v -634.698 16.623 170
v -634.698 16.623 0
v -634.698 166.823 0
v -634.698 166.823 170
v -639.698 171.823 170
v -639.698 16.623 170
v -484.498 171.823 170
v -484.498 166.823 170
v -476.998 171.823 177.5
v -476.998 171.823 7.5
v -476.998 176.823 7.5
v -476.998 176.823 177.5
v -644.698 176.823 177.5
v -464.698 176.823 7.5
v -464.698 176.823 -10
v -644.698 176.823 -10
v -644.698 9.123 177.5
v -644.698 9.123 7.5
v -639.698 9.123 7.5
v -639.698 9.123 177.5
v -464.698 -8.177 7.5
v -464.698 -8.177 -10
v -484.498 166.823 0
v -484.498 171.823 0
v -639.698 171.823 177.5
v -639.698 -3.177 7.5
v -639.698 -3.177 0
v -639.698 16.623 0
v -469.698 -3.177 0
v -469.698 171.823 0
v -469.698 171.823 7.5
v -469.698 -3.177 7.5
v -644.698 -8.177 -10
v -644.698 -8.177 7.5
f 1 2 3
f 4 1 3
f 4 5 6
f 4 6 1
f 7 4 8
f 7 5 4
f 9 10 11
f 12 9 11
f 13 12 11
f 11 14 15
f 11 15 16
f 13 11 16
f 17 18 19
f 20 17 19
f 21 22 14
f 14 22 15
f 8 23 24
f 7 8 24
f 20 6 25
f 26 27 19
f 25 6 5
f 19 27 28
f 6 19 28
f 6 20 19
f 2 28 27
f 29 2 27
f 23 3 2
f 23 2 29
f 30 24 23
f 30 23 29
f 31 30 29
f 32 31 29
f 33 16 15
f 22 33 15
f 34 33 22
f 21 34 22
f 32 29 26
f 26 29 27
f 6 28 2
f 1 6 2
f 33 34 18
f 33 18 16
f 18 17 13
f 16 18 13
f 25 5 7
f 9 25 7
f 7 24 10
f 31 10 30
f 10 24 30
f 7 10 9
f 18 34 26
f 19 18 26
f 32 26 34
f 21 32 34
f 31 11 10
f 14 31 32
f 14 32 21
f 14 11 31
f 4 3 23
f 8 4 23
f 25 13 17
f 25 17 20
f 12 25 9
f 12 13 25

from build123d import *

# Parameters (mm, degrees)
CROQUIS1_W              = 180
CROQUIS1_H              = 185
SALIENTE_EXTRUIR1_DEPTH = 10
SALIENTE_EXTRUIR2_DEPTH = 7.5
SALIENTE_EXTRUIR3_DEPTH = 170
SALIENTE_EXTRUIR4_DEPTH = 177.5


with BuildPart() as part:
    # Croquis1 → Saliente-Extruir1 (new body)
    with BuildSketch(Plane.XY):
        with Locations((-554.698083647, 84.323121588)):
            Rectangle(CROQUIS1_W, CROQUIS1_H)
    extrude(amount=-SALIENTE_EXTRUIR1_DEPTH)

    # Croquis1<3> → Saliente-Extruir2 (add)
    with BuildSketch(Plane.XY):
        Polygon((-464.698083647, 176.823121588), (-476.998083647, 176.823121588), (-476.998083647, 171.823121588), (-469.698083647, 171.823121588), (-469.698083647, -3.176878412), (-639.698083647, -3.176878412), (-639.698083647, 9.123121588), (-644.698083647, 9.123121588), (-644.698083647, -8.176878412), (-464.698083647, -8.176878412), align=None)
    extrude(amount=SALIENTE_EXTRUIR2_DEPTH)

    # Croquis1<5> → Saliente-Extruir3 (add)
    with BuildSketch(Plane.XY):
        Polygon((-484.498083647, 166.823121588), (-484.498083647, 171.823121588), (-639.698083647, 171.823121588), (-639.698083647, 16.623121588), (-634.698083647, 16.623121588), (-634.698083647, 166.823121588), align=None)
    extrude(amount=SALIENTE_EXTRUIR3_DEPTH)

    # Croquis1<6> → Saliente-Extruir4 (add)
    with BuildSketch(Plane.XY):
        Polygon((-476.998083647, 171.823121588), (-476.998083647, 176.823121588), (-644.698083647, 176.823121588), (-644.698083647, 9.123121588), (-639.698083647, 9.123121588), (-639.698083647, 16.623121588), (-639.698083647, 171.823121588), (-484.498083647, 171.823121588), align=None)
    extrude(amount=SALIENTE_EXTRUIR4_DEPTH)


solid = part.part
